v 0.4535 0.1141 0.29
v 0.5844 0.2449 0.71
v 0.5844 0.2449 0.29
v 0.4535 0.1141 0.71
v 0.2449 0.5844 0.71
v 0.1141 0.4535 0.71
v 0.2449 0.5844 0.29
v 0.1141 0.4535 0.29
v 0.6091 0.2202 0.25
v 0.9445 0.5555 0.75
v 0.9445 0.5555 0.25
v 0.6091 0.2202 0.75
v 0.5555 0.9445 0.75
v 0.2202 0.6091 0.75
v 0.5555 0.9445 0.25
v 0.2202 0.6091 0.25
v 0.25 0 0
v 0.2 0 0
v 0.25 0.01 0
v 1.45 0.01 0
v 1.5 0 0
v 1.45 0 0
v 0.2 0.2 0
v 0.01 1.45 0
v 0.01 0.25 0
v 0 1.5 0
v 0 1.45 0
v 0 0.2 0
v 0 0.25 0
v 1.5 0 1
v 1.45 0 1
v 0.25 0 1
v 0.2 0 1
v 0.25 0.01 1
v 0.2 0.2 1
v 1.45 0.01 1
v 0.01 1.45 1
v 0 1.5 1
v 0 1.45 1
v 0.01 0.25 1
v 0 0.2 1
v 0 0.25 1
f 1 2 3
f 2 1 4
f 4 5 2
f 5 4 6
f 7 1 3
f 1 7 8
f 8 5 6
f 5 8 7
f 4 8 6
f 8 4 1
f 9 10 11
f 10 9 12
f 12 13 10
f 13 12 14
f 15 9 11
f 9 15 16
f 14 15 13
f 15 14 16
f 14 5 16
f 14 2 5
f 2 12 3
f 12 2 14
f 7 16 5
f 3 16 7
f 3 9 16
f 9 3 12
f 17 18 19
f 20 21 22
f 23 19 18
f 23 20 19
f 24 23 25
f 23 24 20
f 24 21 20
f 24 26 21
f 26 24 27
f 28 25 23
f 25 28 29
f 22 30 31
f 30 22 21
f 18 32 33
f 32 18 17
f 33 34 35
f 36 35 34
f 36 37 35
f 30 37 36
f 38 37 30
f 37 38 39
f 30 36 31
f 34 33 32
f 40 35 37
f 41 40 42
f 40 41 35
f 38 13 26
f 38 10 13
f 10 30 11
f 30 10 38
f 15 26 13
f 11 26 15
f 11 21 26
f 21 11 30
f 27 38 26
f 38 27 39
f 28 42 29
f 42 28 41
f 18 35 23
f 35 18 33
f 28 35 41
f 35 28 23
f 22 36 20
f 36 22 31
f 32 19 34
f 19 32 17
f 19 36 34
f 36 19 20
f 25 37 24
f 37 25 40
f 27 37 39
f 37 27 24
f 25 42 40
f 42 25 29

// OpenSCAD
// Industrial USB Hub Infrastructure - Corner Block Parameterization
// Resolution for rendering circles
$fn = 64; 

// Core Geometric Constraints (Fits under 1.2 Cubic Inches)
block_width  = 1.50; // Inches
block_height = 1.50; // Inches
block_length = 1.00; // Inches (Extrusion depth)
wall_thickness = 0.08; // 2mm ruggedized wall

module corner_block_node() {
    difference() {
        // 1. Core Right-Triangular Prism (Chassis Body)
        linear_extrude(height = block_length) {
            polygon(points=[[0,0], [block_width,0], [0,block_height]]);
        }
        
        // 2. Recessed Internal Snap-Channel (Rear Wall Facing)
        // Drops the breakaway stub sub-surface so the rubber cap sits completely flush
        translate([-0.05, -0.05, -0.1])
            cube([0.25, 0.25, block_length + 0.2]);
            
        // 3. Pre-Cut Natural Tape Recess (Bottom and Back Planes)
        // Ensures the 100% natural tree-rubber adhesive sits perfectly aligned
        translate([0.25, -0.01, -0.05])
            cube([block_width - 0.3, 0.02, block_length + 0.1]);
        translate([-0.01, 0.25, -0.05])
            cube([0.02, block_height - 0.3, block_length + 0.1]);

        // 4. Standard USB-B Interface Receptacle Cutout
        // Angled out at 45-degrees for easy thumb-stick insertion
        translate([0.45, 0.45, block_length / 2])
            rotate([0, 0, -45])
                union() {
                    // Main port body footprint
                    cube([0.48, 0.47, 0.42], center=true); 
                    // Pass-through clearance for thumb stick seating
                    translate([0, 0.2, 0])
                        cube([0.55, 0.50, 0.50], center=true);
                }
    }
}

// Render node configuration
corner_block_node();
